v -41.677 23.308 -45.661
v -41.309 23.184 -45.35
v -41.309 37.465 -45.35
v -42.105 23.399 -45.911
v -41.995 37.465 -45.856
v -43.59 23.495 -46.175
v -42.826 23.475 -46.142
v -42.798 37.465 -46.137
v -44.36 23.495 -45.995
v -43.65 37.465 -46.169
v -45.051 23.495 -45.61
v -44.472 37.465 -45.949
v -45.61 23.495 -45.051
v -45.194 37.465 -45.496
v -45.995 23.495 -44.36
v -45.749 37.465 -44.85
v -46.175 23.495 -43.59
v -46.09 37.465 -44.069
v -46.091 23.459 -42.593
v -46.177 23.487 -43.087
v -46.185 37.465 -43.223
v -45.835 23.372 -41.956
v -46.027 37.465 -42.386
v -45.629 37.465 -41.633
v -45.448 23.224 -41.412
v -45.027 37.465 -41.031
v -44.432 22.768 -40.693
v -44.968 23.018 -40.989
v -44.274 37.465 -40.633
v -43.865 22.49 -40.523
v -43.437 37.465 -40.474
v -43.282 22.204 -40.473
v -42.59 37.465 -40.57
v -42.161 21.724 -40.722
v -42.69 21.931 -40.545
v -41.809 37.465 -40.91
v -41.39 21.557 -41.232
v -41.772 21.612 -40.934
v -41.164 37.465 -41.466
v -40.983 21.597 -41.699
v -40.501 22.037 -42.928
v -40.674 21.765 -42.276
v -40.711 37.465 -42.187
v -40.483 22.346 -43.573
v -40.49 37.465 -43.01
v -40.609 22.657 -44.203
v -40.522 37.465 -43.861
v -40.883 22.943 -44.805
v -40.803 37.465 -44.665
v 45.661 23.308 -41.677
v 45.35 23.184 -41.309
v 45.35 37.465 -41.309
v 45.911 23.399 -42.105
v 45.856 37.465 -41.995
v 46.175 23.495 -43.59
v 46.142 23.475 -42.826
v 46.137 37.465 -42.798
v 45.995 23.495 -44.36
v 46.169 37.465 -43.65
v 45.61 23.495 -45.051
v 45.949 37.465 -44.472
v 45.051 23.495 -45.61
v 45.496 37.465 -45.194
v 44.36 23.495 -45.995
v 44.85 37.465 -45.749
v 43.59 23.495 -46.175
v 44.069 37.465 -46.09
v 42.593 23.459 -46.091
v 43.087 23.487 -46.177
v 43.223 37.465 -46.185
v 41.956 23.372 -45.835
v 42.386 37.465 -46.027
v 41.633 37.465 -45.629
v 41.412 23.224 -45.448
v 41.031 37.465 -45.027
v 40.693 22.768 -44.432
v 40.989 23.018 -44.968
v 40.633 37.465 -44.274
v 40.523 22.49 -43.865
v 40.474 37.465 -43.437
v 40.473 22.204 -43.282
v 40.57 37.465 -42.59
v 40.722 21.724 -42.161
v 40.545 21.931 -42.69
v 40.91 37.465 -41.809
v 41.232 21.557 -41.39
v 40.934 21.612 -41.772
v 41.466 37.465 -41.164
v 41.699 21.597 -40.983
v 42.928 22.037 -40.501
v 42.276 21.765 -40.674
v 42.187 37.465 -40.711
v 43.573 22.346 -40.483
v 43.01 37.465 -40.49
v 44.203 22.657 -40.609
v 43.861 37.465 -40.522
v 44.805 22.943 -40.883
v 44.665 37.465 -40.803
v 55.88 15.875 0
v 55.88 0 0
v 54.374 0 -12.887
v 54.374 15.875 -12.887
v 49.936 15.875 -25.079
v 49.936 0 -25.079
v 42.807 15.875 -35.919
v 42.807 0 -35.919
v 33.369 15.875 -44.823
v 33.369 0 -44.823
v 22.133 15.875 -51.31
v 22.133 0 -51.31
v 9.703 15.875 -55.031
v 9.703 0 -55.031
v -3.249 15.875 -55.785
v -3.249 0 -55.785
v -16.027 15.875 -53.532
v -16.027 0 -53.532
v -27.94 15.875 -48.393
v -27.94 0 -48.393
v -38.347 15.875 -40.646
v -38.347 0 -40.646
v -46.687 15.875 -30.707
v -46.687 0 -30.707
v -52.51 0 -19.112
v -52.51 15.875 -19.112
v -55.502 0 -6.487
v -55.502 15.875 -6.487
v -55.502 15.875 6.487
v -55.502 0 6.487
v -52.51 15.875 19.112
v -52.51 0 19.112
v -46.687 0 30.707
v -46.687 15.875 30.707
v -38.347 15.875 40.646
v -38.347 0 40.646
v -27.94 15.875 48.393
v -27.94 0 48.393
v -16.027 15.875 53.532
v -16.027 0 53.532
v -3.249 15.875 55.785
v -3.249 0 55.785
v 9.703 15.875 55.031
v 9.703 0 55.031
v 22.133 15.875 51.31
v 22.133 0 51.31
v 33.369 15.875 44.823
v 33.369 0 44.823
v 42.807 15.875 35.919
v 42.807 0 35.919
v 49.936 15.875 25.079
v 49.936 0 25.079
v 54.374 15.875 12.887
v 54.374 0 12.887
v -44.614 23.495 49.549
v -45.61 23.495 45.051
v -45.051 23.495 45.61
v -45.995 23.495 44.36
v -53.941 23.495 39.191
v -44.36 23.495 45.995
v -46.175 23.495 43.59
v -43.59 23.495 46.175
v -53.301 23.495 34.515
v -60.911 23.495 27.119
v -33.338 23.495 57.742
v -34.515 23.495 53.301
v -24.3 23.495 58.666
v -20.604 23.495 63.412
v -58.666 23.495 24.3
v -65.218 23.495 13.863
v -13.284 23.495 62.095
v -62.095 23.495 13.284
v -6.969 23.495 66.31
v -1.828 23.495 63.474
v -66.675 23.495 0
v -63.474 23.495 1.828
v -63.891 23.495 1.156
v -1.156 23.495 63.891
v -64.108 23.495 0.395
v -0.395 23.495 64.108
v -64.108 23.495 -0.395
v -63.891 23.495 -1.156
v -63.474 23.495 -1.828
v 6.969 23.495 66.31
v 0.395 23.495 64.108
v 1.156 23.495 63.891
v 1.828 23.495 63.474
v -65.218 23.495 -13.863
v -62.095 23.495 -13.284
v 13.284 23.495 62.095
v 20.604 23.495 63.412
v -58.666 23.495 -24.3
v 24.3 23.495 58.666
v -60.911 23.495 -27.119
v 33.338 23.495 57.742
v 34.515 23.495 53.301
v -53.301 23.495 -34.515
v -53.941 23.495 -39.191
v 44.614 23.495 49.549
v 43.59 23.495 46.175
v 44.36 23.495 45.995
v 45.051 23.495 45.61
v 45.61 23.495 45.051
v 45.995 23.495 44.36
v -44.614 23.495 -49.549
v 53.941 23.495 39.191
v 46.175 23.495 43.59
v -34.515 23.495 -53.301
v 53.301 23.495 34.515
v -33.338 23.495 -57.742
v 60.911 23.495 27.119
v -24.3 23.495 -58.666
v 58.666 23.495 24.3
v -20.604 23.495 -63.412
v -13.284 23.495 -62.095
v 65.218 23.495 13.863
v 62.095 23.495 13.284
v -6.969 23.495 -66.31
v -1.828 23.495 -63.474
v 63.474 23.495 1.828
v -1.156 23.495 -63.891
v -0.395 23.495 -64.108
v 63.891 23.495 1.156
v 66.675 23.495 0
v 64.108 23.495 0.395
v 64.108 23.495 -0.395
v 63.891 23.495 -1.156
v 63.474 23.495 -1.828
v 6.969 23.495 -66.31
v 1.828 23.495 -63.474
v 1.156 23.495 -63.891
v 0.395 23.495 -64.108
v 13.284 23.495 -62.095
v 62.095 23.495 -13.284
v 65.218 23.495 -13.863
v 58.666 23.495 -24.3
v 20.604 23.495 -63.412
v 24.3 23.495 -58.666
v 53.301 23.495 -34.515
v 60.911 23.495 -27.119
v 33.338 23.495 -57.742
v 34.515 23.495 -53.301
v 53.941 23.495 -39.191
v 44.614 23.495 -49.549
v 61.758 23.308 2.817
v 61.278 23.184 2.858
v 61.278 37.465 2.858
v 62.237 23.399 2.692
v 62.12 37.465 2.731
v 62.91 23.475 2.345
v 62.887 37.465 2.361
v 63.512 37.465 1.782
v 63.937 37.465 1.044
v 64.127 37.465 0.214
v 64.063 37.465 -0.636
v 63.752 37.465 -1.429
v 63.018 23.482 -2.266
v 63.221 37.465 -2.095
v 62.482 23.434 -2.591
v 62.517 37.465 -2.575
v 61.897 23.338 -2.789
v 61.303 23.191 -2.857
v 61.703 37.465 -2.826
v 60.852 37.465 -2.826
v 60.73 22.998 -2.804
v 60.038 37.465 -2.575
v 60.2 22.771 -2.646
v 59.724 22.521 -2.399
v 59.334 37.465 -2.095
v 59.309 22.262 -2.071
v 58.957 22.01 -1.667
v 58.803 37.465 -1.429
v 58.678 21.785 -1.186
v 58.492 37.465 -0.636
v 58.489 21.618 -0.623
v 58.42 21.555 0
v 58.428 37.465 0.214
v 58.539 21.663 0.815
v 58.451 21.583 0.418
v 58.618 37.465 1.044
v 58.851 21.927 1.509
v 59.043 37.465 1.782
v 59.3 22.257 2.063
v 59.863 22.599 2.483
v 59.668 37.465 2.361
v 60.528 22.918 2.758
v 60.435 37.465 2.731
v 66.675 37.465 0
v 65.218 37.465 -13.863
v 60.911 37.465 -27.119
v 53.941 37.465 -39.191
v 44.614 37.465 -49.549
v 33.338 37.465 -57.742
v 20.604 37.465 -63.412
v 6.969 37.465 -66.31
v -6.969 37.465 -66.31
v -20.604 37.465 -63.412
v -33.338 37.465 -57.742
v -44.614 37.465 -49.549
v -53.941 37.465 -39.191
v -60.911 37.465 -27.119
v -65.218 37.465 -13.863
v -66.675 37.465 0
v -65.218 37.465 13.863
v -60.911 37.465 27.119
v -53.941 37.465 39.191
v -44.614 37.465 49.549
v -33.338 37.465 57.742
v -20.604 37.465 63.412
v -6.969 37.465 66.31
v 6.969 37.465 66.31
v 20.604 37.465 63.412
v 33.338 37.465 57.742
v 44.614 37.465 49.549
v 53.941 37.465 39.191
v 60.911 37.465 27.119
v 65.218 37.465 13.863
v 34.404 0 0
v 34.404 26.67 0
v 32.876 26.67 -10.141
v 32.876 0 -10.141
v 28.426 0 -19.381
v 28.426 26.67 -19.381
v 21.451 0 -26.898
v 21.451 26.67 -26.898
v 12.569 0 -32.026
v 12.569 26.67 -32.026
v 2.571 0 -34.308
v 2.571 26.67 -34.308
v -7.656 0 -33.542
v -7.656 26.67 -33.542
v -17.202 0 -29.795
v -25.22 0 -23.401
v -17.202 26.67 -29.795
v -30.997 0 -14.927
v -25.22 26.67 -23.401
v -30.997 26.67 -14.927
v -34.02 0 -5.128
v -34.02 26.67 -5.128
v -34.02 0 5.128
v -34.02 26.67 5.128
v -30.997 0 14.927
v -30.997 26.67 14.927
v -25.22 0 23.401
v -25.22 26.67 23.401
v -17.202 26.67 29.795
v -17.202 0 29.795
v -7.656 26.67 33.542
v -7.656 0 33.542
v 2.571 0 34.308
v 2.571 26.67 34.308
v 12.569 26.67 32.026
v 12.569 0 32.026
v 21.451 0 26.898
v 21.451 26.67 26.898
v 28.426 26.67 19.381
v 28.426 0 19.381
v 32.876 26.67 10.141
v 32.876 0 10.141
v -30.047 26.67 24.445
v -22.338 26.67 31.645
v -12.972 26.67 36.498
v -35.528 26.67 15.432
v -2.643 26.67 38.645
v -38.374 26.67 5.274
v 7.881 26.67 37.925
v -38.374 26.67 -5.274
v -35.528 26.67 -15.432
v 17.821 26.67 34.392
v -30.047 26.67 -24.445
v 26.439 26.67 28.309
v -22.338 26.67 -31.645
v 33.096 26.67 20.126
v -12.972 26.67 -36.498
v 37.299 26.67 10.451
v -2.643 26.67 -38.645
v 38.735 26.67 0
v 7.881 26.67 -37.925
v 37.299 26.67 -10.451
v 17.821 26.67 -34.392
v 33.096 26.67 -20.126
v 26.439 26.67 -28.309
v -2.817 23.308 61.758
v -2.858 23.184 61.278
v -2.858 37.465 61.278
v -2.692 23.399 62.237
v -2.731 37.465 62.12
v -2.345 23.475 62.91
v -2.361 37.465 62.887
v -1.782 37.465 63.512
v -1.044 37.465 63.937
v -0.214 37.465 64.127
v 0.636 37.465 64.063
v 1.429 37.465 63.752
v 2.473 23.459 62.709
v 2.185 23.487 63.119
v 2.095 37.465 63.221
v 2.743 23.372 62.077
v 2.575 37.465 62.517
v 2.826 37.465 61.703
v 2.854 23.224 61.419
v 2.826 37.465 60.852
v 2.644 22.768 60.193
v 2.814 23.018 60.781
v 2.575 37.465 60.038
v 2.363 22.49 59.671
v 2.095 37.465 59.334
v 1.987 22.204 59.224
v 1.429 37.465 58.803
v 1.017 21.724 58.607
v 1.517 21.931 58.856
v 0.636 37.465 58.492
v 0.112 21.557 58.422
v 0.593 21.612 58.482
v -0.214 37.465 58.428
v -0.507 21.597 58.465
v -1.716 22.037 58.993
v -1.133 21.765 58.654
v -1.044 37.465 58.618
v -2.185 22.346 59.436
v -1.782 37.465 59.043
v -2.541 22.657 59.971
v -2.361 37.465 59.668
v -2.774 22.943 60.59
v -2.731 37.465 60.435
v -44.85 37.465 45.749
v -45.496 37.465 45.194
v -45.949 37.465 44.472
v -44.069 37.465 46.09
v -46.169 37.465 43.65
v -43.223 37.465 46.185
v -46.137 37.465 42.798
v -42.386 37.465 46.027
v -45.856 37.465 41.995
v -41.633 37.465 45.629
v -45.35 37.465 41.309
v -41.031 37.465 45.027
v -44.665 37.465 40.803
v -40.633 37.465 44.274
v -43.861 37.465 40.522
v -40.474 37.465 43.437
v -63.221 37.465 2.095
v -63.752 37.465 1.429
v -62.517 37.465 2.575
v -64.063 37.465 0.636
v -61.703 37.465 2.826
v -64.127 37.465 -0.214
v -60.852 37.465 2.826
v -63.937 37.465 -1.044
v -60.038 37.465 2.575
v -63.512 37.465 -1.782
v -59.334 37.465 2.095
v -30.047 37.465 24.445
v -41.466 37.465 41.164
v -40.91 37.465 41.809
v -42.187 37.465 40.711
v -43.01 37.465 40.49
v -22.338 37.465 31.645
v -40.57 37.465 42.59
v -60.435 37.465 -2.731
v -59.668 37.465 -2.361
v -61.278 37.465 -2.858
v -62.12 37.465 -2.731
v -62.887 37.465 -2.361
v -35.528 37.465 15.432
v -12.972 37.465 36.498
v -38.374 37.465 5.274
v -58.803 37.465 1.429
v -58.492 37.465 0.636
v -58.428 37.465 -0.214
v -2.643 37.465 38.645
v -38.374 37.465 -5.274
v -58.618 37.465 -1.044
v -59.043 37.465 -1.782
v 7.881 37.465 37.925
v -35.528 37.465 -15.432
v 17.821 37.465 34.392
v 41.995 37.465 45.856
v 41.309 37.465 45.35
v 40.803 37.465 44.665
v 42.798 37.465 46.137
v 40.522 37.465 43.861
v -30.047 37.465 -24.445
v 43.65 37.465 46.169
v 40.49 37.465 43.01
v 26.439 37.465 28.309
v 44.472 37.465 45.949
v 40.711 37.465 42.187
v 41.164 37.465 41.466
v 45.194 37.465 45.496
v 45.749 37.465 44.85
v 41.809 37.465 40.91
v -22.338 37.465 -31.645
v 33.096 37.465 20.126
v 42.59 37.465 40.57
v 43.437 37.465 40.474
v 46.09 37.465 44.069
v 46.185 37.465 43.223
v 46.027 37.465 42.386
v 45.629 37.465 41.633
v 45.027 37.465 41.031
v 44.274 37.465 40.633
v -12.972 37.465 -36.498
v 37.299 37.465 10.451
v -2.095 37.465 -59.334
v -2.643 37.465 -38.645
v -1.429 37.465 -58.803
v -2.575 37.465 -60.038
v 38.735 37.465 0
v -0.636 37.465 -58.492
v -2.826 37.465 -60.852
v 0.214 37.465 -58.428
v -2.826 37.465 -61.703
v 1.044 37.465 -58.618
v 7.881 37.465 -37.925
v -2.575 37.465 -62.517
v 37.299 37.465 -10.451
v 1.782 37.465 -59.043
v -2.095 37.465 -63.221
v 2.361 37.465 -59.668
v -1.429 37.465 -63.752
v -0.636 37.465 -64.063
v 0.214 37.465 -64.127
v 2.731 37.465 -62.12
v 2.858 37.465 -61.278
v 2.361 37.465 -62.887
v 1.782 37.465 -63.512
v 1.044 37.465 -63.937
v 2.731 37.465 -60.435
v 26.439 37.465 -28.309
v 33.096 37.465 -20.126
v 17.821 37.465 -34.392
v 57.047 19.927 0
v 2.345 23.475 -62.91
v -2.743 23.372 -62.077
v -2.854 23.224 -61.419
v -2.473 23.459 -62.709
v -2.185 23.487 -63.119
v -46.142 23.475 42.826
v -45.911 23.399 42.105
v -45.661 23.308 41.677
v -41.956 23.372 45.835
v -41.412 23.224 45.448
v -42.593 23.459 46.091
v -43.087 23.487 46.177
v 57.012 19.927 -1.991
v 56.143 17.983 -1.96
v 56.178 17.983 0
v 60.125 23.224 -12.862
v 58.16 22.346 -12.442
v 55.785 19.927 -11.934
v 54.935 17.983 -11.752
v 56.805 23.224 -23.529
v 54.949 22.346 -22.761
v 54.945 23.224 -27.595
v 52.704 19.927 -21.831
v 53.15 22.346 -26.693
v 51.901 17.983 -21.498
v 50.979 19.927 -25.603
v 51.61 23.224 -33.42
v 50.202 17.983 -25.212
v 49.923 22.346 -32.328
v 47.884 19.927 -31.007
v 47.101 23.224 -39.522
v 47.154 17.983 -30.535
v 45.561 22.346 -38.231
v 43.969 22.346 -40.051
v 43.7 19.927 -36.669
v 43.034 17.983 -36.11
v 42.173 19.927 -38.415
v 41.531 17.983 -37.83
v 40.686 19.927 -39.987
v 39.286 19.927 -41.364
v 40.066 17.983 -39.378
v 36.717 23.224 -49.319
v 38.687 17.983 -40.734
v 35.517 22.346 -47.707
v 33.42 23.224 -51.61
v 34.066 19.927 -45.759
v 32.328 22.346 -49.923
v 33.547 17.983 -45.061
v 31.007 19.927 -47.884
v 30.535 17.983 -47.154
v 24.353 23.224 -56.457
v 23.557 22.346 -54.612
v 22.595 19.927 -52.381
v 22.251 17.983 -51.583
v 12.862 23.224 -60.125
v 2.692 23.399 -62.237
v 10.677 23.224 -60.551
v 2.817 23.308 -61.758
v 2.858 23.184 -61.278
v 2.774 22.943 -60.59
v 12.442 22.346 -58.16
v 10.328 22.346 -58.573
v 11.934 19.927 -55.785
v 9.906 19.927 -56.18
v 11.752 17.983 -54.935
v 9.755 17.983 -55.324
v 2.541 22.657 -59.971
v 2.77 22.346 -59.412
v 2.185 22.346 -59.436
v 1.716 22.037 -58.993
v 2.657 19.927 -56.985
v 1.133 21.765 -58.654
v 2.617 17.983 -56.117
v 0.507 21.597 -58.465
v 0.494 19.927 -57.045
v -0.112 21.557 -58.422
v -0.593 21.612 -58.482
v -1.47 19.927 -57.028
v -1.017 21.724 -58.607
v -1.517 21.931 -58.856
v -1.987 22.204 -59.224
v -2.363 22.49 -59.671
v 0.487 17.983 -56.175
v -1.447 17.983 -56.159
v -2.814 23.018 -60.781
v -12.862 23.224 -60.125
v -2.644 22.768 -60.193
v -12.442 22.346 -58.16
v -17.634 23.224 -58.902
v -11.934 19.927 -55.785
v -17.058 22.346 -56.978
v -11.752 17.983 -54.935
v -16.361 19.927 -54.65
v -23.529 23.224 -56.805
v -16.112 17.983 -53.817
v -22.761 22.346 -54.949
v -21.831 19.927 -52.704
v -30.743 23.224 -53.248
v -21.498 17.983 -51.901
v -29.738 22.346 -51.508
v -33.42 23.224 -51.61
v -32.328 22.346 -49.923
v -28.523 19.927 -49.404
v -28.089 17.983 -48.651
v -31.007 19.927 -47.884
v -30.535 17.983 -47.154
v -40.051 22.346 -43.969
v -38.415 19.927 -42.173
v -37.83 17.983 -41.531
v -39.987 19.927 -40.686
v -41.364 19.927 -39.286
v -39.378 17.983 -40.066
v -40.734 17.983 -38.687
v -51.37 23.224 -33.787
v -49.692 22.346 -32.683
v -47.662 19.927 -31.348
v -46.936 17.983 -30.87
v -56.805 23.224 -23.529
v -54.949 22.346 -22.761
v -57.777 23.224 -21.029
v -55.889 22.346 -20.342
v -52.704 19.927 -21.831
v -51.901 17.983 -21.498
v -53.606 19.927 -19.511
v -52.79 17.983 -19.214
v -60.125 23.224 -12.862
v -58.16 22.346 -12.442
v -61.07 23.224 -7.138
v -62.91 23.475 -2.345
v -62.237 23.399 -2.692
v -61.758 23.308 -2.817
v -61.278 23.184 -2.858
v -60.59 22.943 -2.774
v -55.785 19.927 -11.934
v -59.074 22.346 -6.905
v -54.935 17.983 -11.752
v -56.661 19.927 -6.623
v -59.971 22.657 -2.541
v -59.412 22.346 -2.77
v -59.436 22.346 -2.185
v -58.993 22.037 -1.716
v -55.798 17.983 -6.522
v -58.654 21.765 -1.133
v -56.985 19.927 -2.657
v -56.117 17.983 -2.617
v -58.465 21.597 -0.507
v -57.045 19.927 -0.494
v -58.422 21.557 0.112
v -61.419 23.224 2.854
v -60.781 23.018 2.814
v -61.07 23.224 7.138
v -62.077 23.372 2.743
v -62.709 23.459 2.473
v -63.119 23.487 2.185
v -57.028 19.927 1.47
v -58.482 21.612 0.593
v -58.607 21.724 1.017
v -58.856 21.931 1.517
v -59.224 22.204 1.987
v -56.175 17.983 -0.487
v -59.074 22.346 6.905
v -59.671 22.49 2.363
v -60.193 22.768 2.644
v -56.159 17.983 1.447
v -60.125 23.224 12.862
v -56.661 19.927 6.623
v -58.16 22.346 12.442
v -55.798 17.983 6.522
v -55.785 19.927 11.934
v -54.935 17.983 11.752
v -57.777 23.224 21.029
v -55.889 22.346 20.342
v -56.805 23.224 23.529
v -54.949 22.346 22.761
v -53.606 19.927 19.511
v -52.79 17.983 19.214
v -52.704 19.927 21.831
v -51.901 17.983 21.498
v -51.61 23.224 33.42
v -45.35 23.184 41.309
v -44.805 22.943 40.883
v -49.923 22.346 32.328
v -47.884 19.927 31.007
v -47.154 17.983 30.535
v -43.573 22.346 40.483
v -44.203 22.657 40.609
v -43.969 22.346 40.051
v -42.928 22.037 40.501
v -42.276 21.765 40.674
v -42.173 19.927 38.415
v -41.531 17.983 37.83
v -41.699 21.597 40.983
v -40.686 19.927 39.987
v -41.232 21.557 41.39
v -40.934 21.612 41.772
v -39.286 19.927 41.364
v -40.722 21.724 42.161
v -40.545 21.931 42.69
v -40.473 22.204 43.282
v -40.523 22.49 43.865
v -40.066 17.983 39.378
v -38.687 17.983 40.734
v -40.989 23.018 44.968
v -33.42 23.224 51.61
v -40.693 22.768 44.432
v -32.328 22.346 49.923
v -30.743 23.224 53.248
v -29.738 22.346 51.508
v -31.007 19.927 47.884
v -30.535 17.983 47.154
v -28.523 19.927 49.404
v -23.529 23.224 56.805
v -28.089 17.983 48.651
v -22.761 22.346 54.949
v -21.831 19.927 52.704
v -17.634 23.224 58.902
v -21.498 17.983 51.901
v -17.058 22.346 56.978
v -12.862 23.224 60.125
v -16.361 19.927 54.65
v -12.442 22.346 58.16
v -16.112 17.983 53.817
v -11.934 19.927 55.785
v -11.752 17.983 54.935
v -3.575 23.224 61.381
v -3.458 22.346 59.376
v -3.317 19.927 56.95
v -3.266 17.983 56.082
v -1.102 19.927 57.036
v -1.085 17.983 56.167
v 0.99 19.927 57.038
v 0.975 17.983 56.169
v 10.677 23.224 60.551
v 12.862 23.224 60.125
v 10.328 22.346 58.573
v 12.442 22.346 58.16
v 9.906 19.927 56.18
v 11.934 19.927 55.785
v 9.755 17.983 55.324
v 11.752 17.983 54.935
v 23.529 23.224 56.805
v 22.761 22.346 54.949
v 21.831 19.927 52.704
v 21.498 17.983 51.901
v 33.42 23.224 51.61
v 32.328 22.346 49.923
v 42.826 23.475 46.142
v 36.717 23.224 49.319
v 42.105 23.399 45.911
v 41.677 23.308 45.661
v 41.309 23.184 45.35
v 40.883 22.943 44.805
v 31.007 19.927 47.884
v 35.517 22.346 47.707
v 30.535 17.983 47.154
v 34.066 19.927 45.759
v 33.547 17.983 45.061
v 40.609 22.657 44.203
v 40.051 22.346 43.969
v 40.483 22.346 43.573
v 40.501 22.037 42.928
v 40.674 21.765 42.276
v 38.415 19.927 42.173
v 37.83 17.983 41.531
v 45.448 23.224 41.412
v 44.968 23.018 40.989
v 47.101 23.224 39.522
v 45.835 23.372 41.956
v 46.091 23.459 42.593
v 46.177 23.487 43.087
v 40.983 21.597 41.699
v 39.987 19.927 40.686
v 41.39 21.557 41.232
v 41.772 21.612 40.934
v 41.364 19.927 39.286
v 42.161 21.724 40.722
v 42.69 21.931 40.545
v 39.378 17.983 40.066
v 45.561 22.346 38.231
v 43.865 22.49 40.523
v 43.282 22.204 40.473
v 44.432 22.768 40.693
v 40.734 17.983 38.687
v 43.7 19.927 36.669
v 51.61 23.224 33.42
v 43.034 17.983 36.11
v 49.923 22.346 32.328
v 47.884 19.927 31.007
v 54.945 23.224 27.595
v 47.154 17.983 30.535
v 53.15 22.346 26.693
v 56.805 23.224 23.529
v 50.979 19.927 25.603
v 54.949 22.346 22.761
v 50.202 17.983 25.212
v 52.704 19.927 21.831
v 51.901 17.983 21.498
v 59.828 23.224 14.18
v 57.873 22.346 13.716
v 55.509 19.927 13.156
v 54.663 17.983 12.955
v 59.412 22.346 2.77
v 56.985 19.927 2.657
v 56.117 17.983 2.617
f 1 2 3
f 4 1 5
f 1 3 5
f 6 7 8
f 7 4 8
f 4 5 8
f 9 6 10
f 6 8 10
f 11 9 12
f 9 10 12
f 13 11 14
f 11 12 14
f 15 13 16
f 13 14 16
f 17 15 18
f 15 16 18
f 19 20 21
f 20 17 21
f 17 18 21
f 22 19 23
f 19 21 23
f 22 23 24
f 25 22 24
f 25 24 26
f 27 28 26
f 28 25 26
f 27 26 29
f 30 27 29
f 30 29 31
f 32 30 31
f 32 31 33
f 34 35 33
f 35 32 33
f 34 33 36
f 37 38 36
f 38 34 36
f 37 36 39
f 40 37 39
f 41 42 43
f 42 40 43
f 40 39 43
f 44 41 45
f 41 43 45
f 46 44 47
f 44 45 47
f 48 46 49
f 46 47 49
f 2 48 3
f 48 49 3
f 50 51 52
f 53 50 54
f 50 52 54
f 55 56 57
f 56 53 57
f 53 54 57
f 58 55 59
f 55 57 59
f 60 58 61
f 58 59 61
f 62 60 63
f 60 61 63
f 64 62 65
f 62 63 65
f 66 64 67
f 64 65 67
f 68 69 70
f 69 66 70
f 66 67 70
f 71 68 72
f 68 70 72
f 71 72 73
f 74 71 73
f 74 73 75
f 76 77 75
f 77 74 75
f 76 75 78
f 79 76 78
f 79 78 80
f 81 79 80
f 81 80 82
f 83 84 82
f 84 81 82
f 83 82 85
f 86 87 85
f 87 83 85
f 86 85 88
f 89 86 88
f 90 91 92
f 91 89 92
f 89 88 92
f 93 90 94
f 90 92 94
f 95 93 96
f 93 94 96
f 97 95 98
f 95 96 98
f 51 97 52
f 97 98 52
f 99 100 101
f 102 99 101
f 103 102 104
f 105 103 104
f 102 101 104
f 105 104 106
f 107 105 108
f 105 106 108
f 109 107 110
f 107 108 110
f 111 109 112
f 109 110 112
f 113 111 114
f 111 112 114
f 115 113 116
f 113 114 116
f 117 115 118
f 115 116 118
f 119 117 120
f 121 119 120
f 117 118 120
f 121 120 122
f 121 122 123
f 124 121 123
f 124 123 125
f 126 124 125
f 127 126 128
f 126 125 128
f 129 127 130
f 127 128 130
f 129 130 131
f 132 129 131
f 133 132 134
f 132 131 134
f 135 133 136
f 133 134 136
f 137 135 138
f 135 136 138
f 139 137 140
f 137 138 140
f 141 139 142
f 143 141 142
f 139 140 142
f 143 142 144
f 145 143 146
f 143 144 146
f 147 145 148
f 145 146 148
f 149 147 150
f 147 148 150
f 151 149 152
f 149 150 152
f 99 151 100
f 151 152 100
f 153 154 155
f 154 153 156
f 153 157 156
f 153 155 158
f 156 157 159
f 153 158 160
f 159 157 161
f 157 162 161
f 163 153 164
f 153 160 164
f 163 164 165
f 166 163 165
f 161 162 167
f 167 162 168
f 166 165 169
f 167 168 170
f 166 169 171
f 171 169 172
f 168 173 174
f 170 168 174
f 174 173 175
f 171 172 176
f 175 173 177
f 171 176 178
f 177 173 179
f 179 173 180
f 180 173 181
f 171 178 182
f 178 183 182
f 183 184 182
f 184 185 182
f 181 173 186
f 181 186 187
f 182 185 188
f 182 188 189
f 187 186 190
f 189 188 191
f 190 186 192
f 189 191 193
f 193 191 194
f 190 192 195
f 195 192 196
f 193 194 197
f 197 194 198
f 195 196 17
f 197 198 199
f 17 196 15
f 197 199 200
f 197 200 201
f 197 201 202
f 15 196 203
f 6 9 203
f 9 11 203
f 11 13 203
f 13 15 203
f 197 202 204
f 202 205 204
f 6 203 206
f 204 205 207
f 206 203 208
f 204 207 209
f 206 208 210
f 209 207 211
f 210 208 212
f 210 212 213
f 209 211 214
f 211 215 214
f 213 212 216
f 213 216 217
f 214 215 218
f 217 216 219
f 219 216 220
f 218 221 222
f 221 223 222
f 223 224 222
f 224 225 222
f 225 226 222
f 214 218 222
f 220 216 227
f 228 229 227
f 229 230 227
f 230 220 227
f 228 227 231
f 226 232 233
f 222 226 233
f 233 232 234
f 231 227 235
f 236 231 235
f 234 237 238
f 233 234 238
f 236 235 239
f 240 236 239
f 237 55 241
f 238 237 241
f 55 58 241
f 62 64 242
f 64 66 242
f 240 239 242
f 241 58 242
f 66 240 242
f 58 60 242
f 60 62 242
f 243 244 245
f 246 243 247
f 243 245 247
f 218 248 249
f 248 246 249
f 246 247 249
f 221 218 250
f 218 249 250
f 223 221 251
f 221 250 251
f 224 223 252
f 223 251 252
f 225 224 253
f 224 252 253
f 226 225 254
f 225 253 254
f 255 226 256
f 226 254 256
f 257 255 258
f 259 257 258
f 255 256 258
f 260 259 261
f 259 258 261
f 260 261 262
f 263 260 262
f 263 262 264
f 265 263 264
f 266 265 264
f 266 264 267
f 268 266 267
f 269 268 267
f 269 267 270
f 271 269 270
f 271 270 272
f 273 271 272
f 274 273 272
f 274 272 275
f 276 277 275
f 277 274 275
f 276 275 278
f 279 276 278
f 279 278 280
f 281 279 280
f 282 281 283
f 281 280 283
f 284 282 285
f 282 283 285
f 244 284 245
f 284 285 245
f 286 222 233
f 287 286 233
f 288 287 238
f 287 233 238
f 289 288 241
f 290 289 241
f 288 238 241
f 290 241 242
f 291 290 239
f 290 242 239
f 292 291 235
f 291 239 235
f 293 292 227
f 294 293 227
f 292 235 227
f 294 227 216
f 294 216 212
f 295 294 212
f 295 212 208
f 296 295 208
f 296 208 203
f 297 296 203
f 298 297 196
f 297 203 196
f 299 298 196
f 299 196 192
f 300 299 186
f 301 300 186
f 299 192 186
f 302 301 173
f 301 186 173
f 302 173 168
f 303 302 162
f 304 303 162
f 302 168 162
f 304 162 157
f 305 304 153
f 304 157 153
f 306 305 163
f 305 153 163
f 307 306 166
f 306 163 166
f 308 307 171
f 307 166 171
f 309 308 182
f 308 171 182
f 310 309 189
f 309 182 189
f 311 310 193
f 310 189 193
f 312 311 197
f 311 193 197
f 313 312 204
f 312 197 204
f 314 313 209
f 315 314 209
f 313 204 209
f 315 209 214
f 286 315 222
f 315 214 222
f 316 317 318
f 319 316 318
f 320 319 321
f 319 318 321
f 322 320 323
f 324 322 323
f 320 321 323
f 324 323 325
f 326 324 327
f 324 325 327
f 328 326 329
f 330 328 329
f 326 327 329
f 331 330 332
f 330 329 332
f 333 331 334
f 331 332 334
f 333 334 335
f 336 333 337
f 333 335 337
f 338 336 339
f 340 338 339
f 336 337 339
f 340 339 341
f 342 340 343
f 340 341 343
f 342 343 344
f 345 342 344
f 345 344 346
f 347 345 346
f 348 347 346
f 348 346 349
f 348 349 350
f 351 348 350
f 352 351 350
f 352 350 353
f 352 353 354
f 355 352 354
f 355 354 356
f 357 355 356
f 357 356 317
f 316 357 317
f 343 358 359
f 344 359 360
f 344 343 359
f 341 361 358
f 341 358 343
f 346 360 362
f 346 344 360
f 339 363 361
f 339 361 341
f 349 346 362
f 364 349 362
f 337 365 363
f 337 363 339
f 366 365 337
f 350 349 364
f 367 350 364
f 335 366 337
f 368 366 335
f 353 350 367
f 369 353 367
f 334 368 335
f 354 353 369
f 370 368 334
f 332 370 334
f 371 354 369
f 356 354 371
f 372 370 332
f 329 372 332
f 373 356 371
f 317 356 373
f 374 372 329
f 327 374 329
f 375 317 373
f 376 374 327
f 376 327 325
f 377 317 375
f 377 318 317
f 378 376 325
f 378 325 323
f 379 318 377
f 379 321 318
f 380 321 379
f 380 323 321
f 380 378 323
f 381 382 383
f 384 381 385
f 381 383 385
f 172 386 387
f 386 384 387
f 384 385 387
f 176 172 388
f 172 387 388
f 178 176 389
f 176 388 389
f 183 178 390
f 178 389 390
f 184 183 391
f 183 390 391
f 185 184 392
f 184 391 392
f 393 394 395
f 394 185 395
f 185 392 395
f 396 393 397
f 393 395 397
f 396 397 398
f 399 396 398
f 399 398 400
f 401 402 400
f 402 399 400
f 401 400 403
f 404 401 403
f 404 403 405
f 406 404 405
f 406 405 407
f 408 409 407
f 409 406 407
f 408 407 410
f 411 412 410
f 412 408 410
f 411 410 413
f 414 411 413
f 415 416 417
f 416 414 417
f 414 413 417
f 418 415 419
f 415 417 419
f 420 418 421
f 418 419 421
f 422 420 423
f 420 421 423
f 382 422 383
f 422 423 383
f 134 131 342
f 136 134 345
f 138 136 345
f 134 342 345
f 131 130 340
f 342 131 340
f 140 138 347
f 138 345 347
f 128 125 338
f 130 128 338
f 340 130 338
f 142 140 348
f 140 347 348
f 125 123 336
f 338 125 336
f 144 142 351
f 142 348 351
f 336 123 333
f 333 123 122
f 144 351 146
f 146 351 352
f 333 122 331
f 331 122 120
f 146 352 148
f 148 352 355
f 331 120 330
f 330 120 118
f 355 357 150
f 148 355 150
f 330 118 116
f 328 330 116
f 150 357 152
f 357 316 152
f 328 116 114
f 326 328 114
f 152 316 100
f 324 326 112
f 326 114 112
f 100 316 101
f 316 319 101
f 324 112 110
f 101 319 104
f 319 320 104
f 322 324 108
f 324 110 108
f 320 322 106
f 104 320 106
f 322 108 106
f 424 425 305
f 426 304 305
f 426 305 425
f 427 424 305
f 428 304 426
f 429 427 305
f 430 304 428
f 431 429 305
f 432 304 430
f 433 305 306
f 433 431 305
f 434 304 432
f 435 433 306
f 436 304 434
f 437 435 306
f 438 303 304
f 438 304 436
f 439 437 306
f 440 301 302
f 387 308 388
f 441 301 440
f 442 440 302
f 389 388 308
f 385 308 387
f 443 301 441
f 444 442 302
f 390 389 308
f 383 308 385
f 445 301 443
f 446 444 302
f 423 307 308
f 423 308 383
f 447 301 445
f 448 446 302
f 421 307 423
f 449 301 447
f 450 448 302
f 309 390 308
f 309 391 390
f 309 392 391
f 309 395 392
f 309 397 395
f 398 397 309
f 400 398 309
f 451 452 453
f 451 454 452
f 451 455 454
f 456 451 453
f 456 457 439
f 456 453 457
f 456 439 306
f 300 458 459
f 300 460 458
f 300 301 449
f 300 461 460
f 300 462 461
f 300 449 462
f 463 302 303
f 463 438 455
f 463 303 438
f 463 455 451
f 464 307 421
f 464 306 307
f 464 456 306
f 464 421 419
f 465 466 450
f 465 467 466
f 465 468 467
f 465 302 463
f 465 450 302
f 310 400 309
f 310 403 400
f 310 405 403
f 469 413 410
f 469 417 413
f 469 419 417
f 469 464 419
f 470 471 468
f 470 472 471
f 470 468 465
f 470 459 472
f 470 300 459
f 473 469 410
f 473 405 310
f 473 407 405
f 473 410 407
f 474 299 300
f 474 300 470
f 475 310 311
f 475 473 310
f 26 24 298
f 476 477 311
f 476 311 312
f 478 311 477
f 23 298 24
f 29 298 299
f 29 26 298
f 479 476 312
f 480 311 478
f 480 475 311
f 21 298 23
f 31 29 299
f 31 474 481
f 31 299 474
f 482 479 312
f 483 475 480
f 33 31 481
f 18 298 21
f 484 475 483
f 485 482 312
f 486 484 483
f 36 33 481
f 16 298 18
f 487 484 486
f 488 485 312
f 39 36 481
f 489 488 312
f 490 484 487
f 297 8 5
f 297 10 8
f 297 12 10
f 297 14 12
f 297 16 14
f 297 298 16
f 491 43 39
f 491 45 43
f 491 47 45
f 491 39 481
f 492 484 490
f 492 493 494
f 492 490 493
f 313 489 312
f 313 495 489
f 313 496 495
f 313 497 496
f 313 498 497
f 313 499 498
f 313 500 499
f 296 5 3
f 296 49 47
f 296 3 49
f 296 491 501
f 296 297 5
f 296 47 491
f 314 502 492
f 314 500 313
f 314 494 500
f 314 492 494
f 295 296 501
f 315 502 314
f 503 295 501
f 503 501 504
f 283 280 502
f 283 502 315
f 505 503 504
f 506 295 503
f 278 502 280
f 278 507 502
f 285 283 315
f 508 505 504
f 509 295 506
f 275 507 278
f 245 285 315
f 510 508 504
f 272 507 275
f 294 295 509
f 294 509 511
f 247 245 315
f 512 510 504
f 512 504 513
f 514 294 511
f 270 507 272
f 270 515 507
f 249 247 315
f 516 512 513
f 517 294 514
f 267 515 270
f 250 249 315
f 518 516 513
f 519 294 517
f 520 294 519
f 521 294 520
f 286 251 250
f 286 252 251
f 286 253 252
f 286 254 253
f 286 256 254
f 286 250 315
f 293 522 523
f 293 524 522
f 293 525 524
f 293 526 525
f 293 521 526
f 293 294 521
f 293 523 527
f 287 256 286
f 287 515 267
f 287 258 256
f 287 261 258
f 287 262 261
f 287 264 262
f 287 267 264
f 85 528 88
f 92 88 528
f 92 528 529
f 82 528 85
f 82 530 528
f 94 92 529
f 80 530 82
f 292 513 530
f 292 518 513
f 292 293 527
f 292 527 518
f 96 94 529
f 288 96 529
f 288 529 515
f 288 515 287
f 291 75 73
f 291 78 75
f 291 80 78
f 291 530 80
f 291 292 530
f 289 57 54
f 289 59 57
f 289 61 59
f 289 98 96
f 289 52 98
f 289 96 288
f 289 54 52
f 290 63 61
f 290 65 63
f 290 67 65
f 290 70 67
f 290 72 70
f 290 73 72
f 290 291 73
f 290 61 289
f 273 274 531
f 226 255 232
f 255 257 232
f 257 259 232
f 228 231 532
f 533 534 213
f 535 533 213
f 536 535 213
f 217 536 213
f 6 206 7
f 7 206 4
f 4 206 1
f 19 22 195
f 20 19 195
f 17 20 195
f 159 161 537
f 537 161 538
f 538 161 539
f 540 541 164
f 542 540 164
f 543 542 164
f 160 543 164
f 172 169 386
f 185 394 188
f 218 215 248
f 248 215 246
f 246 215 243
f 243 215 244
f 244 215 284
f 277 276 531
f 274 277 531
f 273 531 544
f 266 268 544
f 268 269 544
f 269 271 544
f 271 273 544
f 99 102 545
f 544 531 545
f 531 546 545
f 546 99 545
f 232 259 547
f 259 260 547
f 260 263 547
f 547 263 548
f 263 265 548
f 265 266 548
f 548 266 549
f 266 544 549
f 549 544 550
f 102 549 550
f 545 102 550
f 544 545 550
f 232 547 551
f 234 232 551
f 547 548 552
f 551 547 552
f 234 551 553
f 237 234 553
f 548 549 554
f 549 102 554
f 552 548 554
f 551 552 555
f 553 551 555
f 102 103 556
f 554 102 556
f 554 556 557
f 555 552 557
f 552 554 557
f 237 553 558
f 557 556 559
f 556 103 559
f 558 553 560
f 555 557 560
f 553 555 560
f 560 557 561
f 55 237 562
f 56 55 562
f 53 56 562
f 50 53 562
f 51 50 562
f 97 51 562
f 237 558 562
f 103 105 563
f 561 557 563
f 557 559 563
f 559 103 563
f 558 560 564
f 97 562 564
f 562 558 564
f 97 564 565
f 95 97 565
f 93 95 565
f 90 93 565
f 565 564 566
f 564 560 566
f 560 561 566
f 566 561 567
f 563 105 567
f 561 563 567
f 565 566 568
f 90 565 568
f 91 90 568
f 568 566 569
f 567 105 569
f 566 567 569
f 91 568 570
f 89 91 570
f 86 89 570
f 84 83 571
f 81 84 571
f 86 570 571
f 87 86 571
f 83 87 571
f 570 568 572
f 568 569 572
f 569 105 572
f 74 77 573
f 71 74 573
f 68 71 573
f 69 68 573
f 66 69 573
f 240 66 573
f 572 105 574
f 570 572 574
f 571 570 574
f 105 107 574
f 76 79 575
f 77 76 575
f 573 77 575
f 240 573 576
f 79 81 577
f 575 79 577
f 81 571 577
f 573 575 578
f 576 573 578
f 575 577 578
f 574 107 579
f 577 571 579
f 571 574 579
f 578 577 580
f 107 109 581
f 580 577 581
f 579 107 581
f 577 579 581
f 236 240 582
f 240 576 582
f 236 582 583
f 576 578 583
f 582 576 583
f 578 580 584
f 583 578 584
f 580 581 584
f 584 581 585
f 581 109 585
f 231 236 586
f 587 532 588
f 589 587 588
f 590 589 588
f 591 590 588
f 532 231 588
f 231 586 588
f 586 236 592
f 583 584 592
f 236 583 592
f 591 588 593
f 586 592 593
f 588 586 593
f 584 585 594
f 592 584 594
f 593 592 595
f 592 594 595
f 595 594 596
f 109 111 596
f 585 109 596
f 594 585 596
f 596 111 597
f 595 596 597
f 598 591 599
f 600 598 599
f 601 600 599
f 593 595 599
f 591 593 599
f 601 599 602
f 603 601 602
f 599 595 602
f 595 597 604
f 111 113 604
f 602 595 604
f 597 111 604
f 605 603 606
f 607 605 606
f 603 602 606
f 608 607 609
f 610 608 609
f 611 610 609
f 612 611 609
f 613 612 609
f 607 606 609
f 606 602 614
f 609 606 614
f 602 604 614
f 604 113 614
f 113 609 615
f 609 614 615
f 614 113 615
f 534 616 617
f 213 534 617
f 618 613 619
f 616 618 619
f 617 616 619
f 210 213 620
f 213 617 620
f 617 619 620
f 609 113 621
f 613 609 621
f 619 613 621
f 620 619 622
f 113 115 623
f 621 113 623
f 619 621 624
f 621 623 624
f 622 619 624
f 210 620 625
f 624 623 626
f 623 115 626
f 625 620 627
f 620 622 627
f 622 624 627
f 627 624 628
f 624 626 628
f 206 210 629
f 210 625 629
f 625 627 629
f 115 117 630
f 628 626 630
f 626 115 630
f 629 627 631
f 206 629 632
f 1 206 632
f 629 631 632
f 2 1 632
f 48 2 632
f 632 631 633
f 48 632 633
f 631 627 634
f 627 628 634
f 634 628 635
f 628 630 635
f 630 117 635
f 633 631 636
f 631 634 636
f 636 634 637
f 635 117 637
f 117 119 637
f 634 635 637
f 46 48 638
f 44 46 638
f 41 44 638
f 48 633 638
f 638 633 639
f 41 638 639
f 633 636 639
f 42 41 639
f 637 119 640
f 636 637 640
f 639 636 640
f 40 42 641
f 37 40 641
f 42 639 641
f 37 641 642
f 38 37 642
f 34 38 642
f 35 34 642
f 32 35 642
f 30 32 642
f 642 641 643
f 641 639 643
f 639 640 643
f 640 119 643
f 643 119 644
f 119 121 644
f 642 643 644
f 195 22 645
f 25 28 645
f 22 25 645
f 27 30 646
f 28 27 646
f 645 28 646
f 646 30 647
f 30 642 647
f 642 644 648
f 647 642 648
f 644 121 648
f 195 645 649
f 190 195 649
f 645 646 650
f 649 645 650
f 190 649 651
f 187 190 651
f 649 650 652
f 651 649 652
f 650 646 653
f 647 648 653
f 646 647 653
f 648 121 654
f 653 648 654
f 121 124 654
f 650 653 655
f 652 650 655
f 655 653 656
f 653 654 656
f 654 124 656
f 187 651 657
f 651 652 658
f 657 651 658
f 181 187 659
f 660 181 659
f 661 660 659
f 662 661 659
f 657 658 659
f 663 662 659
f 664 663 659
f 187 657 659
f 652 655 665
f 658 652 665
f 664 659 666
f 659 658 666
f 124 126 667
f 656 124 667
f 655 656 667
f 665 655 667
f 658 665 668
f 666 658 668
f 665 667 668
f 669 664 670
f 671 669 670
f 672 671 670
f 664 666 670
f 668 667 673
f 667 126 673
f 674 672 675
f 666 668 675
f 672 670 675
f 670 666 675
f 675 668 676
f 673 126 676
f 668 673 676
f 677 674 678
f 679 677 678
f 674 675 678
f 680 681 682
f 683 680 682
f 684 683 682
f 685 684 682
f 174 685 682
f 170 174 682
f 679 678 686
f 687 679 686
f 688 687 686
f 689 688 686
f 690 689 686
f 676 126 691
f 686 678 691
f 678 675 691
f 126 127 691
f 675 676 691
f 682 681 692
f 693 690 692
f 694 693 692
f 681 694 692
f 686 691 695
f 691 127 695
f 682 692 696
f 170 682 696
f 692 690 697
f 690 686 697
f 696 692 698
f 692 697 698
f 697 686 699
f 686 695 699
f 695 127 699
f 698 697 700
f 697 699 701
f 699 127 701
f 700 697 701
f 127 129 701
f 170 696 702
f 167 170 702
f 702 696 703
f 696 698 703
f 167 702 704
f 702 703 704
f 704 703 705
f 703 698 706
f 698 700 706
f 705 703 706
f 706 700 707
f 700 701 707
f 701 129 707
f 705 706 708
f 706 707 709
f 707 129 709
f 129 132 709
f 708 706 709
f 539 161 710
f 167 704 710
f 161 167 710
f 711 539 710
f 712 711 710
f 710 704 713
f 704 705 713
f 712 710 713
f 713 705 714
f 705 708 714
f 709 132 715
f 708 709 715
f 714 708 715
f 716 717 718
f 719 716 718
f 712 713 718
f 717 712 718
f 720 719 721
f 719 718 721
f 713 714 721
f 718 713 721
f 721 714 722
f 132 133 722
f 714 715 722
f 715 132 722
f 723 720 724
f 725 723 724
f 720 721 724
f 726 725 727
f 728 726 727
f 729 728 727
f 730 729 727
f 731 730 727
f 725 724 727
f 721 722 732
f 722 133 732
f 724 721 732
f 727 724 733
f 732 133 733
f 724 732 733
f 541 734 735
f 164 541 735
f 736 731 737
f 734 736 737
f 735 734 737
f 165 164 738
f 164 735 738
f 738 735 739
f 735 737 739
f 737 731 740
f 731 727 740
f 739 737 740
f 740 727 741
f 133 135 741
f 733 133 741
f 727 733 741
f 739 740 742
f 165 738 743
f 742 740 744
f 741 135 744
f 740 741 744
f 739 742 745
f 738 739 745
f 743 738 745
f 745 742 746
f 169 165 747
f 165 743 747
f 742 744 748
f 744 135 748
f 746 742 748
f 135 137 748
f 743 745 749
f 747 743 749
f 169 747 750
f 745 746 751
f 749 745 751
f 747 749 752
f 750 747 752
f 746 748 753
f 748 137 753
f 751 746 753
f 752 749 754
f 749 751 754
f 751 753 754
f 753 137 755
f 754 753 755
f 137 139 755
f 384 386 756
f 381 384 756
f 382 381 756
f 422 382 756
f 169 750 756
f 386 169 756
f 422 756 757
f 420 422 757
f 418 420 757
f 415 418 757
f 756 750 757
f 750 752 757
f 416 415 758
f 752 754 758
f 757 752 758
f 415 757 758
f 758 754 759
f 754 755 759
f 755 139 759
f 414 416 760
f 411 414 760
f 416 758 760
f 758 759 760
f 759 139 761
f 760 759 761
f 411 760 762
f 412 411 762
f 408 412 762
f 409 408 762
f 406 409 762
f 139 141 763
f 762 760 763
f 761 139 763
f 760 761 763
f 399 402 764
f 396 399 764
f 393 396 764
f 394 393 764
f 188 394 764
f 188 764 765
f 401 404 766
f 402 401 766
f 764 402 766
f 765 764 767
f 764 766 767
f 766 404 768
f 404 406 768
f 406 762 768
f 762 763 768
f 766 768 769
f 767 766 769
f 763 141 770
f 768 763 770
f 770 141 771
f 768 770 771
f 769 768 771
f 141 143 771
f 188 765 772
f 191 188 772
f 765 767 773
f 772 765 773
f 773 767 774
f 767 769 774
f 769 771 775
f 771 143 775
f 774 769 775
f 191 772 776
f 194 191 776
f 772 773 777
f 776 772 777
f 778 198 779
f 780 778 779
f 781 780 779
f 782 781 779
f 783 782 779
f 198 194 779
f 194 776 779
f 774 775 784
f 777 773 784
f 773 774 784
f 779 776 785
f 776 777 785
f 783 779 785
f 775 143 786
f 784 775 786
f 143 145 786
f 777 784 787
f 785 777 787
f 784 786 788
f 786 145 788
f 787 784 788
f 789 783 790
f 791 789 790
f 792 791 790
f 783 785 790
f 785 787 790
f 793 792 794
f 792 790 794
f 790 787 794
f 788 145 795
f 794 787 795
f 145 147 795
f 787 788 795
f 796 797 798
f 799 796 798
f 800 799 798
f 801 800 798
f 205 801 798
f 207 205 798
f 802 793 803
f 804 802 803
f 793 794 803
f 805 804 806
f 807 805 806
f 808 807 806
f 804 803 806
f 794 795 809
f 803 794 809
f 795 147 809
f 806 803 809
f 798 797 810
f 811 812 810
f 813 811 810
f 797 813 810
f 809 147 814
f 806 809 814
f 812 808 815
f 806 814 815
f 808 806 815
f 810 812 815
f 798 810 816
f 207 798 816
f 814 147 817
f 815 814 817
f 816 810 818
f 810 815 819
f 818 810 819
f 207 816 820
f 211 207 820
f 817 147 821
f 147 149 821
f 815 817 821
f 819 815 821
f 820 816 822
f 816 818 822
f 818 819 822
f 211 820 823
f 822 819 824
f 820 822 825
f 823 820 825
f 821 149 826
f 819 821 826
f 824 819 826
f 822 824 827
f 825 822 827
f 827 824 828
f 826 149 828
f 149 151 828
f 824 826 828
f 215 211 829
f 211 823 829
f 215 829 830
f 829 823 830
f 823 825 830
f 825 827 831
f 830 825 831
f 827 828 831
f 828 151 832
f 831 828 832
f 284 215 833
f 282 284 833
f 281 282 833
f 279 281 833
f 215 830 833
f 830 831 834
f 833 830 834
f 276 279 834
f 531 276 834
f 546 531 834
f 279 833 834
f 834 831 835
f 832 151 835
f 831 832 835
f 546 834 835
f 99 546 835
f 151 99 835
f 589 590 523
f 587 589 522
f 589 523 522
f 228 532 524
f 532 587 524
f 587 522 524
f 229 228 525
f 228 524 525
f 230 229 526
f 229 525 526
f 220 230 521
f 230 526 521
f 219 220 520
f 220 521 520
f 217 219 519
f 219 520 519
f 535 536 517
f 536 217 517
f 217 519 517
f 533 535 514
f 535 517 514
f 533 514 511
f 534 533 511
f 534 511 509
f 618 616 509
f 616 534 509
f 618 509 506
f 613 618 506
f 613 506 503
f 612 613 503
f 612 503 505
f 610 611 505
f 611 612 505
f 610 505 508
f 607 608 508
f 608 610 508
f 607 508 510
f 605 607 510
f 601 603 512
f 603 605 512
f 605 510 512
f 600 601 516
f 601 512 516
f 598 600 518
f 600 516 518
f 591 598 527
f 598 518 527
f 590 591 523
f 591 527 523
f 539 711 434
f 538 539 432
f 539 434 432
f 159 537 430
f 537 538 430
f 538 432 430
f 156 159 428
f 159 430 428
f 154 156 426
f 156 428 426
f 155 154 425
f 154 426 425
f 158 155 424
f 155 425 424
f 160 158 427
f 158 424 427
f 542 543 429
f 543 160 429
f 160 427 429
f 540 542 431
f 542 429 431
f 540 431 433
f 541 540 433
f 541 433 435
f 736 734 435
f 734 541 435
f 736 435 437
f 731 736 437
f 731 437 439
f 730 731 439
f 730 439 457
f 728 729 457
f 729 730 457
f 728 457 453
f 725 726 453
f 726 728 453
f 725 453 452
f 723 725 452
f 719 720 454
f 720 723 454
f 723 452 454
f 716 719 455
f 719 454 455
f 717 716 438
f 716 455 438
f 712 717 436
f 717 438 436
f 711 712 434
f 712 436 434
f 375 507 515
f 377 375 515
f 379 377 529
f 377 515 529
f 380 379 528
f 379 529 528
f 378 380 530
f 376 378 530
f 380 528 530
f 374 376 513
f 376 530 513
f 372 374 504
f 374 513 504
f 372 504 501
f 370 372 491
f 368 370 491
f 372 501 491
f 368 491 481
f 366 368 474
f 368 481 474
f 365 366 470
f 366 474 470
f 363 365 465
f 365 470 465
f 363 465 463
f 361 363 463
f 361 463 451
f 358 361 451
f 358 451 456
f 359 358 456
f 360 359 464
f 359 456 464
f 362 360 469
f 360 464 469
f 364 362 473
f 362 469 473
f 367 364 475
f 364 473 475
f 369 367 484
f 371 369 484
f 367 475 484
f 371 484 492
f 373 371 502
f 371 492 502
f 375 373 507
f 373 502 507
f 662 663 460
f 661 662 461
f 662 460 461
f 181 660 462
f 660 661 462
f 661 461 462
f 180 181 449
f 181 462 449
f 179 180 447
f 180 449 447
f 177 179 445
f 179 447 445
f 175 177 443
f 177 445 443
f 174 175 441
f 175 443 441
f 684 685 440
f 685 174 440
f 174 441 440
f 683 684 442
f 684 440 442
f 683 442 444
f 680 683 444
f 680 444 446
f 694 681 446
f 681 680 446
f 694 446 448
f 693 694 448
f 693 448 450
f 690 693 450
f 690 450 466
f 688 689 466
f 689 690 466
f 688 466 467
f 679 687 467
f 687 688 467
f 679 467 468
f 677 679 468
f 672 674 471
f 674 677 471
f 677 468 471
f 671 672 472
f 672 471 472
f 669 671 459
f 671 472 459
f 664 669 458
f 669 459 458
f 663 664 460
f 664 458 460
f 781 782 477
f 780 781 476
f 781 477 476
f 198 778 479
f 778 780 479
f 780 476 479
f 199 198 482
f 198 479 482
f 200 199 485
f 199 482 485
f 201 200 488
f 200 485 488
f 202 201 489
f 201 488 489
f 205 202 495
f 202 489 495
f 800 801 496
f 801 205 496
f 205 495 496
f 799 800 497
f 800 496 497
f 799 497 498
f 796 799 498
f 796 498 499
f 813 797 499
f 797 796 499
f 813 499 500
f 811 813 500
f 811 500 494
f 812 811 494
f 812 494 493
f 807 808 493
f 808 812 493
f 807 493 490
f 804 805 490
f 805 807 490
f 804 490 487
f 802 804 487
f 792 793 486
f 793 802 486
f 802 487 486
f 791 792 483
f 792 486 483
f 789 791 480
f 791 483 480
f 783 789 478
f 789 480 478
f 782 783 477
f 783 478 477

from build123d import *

# Parameters (mm, degrees)
SKETCH1_R           = 55.88
BOSS_EXTRUDE1_DEPTH = 23.495
SKETCH2_R           = 66.675
BOSS_EXTRUDE2_DEPTH = 13.97
FILLET1_R           = 7.62
SKETCH3_R           = 2.8575
CUT_EXTRUDE1_DEPTH  = 38.465
CIRPATTERN1_COUNT   = 8
SKETCH4_R           = 38.735
CUT_EXTRUDE2_DEPTH  = 10.795
SKETCH5_R           = 34.4043
CUT_EXTRUDE3_DEPTH  = 40.894


with BuildPart() as part:
    # Sketch1 → Boss-Extrude1 (new body)
    with BuildSketch(Plane(origin=(0, 0, 0), x_dir=(1, 0, 0), z_dir=(0, 1, 0))):
        Circle(SKETCH1_R)
    extrude(amount=BOSS_EXTRUDE1_DEPTH)

    # Sketch2 → Boss-Extrude2 (add)
    with BuildSketch(Plane(origin=(0, 23.495, 0), x_dir=(1, 0, 0), z_dir=(0, 1, 0))):
        Circle(SKETCH2_R)
    extrude(amount=BOSS_EXTRUDE2_DEPTH)

    # Fillet1
    fillet1_edges = [part.edges().sort_by_distance(p)[0] for p in [
        (-55.88, 23.495, 0),
    ]]
    fillet(fillet1_edges, radius=FILLET1_R)

    # Sketch3 → Cut-Extrude1 (cut, through all)
    with BuildSketch(Plane(origin=(0, 37.465, 0), x_dir=(1, 0, 0), z_dir=(0, 1, 0))):
        with Locations((0, 61.2775)):
            Circle(SKETCH3_R)
    cut_extrude1 = extrude(amount=-CUT_EXTRUDE1_DEPTH, mode=Mode.SUBTRACT)

    # CirPattern1: Cut-Extrude1 ×8 about axis
    cirpattern1_axis = Axis((0, 0, 0), (0, 1, 0))
    for i in range(1, CIRPATTERN1_COUNT):
        add(cut_extrude1.rotate(cirpattern1_axis, i * 360 / CIRPATTERN1_COUNT), mode=Mode.SUBTRACT)

    # Sketch4 → Cut-Extrude2 (cut)
    with BuildSketch(Plane(origin=(0, 37.465, 0), x_dir=(1, 0, 0), z_dir=(0, 1, 0))):
        Circle(SKETCH4_R)
    extrude(amount=-CUT_EXTRUDE2_DEPTH, mode=Mode.SUBTRACT)

    # Sketch5 → Cut-Extrude3 (cut)
    with BuildSketch(Plane(origin=(0, 26.67, 0), x_dir=(1, 0, 0), z_dir=(0, 1, 0))):
        Circle(SKETCH5_R)
    extrude(amount=-CUT_EXTRUDE3_DEPTH, mode=Mode.SUBTRACT)


solid = part.part
